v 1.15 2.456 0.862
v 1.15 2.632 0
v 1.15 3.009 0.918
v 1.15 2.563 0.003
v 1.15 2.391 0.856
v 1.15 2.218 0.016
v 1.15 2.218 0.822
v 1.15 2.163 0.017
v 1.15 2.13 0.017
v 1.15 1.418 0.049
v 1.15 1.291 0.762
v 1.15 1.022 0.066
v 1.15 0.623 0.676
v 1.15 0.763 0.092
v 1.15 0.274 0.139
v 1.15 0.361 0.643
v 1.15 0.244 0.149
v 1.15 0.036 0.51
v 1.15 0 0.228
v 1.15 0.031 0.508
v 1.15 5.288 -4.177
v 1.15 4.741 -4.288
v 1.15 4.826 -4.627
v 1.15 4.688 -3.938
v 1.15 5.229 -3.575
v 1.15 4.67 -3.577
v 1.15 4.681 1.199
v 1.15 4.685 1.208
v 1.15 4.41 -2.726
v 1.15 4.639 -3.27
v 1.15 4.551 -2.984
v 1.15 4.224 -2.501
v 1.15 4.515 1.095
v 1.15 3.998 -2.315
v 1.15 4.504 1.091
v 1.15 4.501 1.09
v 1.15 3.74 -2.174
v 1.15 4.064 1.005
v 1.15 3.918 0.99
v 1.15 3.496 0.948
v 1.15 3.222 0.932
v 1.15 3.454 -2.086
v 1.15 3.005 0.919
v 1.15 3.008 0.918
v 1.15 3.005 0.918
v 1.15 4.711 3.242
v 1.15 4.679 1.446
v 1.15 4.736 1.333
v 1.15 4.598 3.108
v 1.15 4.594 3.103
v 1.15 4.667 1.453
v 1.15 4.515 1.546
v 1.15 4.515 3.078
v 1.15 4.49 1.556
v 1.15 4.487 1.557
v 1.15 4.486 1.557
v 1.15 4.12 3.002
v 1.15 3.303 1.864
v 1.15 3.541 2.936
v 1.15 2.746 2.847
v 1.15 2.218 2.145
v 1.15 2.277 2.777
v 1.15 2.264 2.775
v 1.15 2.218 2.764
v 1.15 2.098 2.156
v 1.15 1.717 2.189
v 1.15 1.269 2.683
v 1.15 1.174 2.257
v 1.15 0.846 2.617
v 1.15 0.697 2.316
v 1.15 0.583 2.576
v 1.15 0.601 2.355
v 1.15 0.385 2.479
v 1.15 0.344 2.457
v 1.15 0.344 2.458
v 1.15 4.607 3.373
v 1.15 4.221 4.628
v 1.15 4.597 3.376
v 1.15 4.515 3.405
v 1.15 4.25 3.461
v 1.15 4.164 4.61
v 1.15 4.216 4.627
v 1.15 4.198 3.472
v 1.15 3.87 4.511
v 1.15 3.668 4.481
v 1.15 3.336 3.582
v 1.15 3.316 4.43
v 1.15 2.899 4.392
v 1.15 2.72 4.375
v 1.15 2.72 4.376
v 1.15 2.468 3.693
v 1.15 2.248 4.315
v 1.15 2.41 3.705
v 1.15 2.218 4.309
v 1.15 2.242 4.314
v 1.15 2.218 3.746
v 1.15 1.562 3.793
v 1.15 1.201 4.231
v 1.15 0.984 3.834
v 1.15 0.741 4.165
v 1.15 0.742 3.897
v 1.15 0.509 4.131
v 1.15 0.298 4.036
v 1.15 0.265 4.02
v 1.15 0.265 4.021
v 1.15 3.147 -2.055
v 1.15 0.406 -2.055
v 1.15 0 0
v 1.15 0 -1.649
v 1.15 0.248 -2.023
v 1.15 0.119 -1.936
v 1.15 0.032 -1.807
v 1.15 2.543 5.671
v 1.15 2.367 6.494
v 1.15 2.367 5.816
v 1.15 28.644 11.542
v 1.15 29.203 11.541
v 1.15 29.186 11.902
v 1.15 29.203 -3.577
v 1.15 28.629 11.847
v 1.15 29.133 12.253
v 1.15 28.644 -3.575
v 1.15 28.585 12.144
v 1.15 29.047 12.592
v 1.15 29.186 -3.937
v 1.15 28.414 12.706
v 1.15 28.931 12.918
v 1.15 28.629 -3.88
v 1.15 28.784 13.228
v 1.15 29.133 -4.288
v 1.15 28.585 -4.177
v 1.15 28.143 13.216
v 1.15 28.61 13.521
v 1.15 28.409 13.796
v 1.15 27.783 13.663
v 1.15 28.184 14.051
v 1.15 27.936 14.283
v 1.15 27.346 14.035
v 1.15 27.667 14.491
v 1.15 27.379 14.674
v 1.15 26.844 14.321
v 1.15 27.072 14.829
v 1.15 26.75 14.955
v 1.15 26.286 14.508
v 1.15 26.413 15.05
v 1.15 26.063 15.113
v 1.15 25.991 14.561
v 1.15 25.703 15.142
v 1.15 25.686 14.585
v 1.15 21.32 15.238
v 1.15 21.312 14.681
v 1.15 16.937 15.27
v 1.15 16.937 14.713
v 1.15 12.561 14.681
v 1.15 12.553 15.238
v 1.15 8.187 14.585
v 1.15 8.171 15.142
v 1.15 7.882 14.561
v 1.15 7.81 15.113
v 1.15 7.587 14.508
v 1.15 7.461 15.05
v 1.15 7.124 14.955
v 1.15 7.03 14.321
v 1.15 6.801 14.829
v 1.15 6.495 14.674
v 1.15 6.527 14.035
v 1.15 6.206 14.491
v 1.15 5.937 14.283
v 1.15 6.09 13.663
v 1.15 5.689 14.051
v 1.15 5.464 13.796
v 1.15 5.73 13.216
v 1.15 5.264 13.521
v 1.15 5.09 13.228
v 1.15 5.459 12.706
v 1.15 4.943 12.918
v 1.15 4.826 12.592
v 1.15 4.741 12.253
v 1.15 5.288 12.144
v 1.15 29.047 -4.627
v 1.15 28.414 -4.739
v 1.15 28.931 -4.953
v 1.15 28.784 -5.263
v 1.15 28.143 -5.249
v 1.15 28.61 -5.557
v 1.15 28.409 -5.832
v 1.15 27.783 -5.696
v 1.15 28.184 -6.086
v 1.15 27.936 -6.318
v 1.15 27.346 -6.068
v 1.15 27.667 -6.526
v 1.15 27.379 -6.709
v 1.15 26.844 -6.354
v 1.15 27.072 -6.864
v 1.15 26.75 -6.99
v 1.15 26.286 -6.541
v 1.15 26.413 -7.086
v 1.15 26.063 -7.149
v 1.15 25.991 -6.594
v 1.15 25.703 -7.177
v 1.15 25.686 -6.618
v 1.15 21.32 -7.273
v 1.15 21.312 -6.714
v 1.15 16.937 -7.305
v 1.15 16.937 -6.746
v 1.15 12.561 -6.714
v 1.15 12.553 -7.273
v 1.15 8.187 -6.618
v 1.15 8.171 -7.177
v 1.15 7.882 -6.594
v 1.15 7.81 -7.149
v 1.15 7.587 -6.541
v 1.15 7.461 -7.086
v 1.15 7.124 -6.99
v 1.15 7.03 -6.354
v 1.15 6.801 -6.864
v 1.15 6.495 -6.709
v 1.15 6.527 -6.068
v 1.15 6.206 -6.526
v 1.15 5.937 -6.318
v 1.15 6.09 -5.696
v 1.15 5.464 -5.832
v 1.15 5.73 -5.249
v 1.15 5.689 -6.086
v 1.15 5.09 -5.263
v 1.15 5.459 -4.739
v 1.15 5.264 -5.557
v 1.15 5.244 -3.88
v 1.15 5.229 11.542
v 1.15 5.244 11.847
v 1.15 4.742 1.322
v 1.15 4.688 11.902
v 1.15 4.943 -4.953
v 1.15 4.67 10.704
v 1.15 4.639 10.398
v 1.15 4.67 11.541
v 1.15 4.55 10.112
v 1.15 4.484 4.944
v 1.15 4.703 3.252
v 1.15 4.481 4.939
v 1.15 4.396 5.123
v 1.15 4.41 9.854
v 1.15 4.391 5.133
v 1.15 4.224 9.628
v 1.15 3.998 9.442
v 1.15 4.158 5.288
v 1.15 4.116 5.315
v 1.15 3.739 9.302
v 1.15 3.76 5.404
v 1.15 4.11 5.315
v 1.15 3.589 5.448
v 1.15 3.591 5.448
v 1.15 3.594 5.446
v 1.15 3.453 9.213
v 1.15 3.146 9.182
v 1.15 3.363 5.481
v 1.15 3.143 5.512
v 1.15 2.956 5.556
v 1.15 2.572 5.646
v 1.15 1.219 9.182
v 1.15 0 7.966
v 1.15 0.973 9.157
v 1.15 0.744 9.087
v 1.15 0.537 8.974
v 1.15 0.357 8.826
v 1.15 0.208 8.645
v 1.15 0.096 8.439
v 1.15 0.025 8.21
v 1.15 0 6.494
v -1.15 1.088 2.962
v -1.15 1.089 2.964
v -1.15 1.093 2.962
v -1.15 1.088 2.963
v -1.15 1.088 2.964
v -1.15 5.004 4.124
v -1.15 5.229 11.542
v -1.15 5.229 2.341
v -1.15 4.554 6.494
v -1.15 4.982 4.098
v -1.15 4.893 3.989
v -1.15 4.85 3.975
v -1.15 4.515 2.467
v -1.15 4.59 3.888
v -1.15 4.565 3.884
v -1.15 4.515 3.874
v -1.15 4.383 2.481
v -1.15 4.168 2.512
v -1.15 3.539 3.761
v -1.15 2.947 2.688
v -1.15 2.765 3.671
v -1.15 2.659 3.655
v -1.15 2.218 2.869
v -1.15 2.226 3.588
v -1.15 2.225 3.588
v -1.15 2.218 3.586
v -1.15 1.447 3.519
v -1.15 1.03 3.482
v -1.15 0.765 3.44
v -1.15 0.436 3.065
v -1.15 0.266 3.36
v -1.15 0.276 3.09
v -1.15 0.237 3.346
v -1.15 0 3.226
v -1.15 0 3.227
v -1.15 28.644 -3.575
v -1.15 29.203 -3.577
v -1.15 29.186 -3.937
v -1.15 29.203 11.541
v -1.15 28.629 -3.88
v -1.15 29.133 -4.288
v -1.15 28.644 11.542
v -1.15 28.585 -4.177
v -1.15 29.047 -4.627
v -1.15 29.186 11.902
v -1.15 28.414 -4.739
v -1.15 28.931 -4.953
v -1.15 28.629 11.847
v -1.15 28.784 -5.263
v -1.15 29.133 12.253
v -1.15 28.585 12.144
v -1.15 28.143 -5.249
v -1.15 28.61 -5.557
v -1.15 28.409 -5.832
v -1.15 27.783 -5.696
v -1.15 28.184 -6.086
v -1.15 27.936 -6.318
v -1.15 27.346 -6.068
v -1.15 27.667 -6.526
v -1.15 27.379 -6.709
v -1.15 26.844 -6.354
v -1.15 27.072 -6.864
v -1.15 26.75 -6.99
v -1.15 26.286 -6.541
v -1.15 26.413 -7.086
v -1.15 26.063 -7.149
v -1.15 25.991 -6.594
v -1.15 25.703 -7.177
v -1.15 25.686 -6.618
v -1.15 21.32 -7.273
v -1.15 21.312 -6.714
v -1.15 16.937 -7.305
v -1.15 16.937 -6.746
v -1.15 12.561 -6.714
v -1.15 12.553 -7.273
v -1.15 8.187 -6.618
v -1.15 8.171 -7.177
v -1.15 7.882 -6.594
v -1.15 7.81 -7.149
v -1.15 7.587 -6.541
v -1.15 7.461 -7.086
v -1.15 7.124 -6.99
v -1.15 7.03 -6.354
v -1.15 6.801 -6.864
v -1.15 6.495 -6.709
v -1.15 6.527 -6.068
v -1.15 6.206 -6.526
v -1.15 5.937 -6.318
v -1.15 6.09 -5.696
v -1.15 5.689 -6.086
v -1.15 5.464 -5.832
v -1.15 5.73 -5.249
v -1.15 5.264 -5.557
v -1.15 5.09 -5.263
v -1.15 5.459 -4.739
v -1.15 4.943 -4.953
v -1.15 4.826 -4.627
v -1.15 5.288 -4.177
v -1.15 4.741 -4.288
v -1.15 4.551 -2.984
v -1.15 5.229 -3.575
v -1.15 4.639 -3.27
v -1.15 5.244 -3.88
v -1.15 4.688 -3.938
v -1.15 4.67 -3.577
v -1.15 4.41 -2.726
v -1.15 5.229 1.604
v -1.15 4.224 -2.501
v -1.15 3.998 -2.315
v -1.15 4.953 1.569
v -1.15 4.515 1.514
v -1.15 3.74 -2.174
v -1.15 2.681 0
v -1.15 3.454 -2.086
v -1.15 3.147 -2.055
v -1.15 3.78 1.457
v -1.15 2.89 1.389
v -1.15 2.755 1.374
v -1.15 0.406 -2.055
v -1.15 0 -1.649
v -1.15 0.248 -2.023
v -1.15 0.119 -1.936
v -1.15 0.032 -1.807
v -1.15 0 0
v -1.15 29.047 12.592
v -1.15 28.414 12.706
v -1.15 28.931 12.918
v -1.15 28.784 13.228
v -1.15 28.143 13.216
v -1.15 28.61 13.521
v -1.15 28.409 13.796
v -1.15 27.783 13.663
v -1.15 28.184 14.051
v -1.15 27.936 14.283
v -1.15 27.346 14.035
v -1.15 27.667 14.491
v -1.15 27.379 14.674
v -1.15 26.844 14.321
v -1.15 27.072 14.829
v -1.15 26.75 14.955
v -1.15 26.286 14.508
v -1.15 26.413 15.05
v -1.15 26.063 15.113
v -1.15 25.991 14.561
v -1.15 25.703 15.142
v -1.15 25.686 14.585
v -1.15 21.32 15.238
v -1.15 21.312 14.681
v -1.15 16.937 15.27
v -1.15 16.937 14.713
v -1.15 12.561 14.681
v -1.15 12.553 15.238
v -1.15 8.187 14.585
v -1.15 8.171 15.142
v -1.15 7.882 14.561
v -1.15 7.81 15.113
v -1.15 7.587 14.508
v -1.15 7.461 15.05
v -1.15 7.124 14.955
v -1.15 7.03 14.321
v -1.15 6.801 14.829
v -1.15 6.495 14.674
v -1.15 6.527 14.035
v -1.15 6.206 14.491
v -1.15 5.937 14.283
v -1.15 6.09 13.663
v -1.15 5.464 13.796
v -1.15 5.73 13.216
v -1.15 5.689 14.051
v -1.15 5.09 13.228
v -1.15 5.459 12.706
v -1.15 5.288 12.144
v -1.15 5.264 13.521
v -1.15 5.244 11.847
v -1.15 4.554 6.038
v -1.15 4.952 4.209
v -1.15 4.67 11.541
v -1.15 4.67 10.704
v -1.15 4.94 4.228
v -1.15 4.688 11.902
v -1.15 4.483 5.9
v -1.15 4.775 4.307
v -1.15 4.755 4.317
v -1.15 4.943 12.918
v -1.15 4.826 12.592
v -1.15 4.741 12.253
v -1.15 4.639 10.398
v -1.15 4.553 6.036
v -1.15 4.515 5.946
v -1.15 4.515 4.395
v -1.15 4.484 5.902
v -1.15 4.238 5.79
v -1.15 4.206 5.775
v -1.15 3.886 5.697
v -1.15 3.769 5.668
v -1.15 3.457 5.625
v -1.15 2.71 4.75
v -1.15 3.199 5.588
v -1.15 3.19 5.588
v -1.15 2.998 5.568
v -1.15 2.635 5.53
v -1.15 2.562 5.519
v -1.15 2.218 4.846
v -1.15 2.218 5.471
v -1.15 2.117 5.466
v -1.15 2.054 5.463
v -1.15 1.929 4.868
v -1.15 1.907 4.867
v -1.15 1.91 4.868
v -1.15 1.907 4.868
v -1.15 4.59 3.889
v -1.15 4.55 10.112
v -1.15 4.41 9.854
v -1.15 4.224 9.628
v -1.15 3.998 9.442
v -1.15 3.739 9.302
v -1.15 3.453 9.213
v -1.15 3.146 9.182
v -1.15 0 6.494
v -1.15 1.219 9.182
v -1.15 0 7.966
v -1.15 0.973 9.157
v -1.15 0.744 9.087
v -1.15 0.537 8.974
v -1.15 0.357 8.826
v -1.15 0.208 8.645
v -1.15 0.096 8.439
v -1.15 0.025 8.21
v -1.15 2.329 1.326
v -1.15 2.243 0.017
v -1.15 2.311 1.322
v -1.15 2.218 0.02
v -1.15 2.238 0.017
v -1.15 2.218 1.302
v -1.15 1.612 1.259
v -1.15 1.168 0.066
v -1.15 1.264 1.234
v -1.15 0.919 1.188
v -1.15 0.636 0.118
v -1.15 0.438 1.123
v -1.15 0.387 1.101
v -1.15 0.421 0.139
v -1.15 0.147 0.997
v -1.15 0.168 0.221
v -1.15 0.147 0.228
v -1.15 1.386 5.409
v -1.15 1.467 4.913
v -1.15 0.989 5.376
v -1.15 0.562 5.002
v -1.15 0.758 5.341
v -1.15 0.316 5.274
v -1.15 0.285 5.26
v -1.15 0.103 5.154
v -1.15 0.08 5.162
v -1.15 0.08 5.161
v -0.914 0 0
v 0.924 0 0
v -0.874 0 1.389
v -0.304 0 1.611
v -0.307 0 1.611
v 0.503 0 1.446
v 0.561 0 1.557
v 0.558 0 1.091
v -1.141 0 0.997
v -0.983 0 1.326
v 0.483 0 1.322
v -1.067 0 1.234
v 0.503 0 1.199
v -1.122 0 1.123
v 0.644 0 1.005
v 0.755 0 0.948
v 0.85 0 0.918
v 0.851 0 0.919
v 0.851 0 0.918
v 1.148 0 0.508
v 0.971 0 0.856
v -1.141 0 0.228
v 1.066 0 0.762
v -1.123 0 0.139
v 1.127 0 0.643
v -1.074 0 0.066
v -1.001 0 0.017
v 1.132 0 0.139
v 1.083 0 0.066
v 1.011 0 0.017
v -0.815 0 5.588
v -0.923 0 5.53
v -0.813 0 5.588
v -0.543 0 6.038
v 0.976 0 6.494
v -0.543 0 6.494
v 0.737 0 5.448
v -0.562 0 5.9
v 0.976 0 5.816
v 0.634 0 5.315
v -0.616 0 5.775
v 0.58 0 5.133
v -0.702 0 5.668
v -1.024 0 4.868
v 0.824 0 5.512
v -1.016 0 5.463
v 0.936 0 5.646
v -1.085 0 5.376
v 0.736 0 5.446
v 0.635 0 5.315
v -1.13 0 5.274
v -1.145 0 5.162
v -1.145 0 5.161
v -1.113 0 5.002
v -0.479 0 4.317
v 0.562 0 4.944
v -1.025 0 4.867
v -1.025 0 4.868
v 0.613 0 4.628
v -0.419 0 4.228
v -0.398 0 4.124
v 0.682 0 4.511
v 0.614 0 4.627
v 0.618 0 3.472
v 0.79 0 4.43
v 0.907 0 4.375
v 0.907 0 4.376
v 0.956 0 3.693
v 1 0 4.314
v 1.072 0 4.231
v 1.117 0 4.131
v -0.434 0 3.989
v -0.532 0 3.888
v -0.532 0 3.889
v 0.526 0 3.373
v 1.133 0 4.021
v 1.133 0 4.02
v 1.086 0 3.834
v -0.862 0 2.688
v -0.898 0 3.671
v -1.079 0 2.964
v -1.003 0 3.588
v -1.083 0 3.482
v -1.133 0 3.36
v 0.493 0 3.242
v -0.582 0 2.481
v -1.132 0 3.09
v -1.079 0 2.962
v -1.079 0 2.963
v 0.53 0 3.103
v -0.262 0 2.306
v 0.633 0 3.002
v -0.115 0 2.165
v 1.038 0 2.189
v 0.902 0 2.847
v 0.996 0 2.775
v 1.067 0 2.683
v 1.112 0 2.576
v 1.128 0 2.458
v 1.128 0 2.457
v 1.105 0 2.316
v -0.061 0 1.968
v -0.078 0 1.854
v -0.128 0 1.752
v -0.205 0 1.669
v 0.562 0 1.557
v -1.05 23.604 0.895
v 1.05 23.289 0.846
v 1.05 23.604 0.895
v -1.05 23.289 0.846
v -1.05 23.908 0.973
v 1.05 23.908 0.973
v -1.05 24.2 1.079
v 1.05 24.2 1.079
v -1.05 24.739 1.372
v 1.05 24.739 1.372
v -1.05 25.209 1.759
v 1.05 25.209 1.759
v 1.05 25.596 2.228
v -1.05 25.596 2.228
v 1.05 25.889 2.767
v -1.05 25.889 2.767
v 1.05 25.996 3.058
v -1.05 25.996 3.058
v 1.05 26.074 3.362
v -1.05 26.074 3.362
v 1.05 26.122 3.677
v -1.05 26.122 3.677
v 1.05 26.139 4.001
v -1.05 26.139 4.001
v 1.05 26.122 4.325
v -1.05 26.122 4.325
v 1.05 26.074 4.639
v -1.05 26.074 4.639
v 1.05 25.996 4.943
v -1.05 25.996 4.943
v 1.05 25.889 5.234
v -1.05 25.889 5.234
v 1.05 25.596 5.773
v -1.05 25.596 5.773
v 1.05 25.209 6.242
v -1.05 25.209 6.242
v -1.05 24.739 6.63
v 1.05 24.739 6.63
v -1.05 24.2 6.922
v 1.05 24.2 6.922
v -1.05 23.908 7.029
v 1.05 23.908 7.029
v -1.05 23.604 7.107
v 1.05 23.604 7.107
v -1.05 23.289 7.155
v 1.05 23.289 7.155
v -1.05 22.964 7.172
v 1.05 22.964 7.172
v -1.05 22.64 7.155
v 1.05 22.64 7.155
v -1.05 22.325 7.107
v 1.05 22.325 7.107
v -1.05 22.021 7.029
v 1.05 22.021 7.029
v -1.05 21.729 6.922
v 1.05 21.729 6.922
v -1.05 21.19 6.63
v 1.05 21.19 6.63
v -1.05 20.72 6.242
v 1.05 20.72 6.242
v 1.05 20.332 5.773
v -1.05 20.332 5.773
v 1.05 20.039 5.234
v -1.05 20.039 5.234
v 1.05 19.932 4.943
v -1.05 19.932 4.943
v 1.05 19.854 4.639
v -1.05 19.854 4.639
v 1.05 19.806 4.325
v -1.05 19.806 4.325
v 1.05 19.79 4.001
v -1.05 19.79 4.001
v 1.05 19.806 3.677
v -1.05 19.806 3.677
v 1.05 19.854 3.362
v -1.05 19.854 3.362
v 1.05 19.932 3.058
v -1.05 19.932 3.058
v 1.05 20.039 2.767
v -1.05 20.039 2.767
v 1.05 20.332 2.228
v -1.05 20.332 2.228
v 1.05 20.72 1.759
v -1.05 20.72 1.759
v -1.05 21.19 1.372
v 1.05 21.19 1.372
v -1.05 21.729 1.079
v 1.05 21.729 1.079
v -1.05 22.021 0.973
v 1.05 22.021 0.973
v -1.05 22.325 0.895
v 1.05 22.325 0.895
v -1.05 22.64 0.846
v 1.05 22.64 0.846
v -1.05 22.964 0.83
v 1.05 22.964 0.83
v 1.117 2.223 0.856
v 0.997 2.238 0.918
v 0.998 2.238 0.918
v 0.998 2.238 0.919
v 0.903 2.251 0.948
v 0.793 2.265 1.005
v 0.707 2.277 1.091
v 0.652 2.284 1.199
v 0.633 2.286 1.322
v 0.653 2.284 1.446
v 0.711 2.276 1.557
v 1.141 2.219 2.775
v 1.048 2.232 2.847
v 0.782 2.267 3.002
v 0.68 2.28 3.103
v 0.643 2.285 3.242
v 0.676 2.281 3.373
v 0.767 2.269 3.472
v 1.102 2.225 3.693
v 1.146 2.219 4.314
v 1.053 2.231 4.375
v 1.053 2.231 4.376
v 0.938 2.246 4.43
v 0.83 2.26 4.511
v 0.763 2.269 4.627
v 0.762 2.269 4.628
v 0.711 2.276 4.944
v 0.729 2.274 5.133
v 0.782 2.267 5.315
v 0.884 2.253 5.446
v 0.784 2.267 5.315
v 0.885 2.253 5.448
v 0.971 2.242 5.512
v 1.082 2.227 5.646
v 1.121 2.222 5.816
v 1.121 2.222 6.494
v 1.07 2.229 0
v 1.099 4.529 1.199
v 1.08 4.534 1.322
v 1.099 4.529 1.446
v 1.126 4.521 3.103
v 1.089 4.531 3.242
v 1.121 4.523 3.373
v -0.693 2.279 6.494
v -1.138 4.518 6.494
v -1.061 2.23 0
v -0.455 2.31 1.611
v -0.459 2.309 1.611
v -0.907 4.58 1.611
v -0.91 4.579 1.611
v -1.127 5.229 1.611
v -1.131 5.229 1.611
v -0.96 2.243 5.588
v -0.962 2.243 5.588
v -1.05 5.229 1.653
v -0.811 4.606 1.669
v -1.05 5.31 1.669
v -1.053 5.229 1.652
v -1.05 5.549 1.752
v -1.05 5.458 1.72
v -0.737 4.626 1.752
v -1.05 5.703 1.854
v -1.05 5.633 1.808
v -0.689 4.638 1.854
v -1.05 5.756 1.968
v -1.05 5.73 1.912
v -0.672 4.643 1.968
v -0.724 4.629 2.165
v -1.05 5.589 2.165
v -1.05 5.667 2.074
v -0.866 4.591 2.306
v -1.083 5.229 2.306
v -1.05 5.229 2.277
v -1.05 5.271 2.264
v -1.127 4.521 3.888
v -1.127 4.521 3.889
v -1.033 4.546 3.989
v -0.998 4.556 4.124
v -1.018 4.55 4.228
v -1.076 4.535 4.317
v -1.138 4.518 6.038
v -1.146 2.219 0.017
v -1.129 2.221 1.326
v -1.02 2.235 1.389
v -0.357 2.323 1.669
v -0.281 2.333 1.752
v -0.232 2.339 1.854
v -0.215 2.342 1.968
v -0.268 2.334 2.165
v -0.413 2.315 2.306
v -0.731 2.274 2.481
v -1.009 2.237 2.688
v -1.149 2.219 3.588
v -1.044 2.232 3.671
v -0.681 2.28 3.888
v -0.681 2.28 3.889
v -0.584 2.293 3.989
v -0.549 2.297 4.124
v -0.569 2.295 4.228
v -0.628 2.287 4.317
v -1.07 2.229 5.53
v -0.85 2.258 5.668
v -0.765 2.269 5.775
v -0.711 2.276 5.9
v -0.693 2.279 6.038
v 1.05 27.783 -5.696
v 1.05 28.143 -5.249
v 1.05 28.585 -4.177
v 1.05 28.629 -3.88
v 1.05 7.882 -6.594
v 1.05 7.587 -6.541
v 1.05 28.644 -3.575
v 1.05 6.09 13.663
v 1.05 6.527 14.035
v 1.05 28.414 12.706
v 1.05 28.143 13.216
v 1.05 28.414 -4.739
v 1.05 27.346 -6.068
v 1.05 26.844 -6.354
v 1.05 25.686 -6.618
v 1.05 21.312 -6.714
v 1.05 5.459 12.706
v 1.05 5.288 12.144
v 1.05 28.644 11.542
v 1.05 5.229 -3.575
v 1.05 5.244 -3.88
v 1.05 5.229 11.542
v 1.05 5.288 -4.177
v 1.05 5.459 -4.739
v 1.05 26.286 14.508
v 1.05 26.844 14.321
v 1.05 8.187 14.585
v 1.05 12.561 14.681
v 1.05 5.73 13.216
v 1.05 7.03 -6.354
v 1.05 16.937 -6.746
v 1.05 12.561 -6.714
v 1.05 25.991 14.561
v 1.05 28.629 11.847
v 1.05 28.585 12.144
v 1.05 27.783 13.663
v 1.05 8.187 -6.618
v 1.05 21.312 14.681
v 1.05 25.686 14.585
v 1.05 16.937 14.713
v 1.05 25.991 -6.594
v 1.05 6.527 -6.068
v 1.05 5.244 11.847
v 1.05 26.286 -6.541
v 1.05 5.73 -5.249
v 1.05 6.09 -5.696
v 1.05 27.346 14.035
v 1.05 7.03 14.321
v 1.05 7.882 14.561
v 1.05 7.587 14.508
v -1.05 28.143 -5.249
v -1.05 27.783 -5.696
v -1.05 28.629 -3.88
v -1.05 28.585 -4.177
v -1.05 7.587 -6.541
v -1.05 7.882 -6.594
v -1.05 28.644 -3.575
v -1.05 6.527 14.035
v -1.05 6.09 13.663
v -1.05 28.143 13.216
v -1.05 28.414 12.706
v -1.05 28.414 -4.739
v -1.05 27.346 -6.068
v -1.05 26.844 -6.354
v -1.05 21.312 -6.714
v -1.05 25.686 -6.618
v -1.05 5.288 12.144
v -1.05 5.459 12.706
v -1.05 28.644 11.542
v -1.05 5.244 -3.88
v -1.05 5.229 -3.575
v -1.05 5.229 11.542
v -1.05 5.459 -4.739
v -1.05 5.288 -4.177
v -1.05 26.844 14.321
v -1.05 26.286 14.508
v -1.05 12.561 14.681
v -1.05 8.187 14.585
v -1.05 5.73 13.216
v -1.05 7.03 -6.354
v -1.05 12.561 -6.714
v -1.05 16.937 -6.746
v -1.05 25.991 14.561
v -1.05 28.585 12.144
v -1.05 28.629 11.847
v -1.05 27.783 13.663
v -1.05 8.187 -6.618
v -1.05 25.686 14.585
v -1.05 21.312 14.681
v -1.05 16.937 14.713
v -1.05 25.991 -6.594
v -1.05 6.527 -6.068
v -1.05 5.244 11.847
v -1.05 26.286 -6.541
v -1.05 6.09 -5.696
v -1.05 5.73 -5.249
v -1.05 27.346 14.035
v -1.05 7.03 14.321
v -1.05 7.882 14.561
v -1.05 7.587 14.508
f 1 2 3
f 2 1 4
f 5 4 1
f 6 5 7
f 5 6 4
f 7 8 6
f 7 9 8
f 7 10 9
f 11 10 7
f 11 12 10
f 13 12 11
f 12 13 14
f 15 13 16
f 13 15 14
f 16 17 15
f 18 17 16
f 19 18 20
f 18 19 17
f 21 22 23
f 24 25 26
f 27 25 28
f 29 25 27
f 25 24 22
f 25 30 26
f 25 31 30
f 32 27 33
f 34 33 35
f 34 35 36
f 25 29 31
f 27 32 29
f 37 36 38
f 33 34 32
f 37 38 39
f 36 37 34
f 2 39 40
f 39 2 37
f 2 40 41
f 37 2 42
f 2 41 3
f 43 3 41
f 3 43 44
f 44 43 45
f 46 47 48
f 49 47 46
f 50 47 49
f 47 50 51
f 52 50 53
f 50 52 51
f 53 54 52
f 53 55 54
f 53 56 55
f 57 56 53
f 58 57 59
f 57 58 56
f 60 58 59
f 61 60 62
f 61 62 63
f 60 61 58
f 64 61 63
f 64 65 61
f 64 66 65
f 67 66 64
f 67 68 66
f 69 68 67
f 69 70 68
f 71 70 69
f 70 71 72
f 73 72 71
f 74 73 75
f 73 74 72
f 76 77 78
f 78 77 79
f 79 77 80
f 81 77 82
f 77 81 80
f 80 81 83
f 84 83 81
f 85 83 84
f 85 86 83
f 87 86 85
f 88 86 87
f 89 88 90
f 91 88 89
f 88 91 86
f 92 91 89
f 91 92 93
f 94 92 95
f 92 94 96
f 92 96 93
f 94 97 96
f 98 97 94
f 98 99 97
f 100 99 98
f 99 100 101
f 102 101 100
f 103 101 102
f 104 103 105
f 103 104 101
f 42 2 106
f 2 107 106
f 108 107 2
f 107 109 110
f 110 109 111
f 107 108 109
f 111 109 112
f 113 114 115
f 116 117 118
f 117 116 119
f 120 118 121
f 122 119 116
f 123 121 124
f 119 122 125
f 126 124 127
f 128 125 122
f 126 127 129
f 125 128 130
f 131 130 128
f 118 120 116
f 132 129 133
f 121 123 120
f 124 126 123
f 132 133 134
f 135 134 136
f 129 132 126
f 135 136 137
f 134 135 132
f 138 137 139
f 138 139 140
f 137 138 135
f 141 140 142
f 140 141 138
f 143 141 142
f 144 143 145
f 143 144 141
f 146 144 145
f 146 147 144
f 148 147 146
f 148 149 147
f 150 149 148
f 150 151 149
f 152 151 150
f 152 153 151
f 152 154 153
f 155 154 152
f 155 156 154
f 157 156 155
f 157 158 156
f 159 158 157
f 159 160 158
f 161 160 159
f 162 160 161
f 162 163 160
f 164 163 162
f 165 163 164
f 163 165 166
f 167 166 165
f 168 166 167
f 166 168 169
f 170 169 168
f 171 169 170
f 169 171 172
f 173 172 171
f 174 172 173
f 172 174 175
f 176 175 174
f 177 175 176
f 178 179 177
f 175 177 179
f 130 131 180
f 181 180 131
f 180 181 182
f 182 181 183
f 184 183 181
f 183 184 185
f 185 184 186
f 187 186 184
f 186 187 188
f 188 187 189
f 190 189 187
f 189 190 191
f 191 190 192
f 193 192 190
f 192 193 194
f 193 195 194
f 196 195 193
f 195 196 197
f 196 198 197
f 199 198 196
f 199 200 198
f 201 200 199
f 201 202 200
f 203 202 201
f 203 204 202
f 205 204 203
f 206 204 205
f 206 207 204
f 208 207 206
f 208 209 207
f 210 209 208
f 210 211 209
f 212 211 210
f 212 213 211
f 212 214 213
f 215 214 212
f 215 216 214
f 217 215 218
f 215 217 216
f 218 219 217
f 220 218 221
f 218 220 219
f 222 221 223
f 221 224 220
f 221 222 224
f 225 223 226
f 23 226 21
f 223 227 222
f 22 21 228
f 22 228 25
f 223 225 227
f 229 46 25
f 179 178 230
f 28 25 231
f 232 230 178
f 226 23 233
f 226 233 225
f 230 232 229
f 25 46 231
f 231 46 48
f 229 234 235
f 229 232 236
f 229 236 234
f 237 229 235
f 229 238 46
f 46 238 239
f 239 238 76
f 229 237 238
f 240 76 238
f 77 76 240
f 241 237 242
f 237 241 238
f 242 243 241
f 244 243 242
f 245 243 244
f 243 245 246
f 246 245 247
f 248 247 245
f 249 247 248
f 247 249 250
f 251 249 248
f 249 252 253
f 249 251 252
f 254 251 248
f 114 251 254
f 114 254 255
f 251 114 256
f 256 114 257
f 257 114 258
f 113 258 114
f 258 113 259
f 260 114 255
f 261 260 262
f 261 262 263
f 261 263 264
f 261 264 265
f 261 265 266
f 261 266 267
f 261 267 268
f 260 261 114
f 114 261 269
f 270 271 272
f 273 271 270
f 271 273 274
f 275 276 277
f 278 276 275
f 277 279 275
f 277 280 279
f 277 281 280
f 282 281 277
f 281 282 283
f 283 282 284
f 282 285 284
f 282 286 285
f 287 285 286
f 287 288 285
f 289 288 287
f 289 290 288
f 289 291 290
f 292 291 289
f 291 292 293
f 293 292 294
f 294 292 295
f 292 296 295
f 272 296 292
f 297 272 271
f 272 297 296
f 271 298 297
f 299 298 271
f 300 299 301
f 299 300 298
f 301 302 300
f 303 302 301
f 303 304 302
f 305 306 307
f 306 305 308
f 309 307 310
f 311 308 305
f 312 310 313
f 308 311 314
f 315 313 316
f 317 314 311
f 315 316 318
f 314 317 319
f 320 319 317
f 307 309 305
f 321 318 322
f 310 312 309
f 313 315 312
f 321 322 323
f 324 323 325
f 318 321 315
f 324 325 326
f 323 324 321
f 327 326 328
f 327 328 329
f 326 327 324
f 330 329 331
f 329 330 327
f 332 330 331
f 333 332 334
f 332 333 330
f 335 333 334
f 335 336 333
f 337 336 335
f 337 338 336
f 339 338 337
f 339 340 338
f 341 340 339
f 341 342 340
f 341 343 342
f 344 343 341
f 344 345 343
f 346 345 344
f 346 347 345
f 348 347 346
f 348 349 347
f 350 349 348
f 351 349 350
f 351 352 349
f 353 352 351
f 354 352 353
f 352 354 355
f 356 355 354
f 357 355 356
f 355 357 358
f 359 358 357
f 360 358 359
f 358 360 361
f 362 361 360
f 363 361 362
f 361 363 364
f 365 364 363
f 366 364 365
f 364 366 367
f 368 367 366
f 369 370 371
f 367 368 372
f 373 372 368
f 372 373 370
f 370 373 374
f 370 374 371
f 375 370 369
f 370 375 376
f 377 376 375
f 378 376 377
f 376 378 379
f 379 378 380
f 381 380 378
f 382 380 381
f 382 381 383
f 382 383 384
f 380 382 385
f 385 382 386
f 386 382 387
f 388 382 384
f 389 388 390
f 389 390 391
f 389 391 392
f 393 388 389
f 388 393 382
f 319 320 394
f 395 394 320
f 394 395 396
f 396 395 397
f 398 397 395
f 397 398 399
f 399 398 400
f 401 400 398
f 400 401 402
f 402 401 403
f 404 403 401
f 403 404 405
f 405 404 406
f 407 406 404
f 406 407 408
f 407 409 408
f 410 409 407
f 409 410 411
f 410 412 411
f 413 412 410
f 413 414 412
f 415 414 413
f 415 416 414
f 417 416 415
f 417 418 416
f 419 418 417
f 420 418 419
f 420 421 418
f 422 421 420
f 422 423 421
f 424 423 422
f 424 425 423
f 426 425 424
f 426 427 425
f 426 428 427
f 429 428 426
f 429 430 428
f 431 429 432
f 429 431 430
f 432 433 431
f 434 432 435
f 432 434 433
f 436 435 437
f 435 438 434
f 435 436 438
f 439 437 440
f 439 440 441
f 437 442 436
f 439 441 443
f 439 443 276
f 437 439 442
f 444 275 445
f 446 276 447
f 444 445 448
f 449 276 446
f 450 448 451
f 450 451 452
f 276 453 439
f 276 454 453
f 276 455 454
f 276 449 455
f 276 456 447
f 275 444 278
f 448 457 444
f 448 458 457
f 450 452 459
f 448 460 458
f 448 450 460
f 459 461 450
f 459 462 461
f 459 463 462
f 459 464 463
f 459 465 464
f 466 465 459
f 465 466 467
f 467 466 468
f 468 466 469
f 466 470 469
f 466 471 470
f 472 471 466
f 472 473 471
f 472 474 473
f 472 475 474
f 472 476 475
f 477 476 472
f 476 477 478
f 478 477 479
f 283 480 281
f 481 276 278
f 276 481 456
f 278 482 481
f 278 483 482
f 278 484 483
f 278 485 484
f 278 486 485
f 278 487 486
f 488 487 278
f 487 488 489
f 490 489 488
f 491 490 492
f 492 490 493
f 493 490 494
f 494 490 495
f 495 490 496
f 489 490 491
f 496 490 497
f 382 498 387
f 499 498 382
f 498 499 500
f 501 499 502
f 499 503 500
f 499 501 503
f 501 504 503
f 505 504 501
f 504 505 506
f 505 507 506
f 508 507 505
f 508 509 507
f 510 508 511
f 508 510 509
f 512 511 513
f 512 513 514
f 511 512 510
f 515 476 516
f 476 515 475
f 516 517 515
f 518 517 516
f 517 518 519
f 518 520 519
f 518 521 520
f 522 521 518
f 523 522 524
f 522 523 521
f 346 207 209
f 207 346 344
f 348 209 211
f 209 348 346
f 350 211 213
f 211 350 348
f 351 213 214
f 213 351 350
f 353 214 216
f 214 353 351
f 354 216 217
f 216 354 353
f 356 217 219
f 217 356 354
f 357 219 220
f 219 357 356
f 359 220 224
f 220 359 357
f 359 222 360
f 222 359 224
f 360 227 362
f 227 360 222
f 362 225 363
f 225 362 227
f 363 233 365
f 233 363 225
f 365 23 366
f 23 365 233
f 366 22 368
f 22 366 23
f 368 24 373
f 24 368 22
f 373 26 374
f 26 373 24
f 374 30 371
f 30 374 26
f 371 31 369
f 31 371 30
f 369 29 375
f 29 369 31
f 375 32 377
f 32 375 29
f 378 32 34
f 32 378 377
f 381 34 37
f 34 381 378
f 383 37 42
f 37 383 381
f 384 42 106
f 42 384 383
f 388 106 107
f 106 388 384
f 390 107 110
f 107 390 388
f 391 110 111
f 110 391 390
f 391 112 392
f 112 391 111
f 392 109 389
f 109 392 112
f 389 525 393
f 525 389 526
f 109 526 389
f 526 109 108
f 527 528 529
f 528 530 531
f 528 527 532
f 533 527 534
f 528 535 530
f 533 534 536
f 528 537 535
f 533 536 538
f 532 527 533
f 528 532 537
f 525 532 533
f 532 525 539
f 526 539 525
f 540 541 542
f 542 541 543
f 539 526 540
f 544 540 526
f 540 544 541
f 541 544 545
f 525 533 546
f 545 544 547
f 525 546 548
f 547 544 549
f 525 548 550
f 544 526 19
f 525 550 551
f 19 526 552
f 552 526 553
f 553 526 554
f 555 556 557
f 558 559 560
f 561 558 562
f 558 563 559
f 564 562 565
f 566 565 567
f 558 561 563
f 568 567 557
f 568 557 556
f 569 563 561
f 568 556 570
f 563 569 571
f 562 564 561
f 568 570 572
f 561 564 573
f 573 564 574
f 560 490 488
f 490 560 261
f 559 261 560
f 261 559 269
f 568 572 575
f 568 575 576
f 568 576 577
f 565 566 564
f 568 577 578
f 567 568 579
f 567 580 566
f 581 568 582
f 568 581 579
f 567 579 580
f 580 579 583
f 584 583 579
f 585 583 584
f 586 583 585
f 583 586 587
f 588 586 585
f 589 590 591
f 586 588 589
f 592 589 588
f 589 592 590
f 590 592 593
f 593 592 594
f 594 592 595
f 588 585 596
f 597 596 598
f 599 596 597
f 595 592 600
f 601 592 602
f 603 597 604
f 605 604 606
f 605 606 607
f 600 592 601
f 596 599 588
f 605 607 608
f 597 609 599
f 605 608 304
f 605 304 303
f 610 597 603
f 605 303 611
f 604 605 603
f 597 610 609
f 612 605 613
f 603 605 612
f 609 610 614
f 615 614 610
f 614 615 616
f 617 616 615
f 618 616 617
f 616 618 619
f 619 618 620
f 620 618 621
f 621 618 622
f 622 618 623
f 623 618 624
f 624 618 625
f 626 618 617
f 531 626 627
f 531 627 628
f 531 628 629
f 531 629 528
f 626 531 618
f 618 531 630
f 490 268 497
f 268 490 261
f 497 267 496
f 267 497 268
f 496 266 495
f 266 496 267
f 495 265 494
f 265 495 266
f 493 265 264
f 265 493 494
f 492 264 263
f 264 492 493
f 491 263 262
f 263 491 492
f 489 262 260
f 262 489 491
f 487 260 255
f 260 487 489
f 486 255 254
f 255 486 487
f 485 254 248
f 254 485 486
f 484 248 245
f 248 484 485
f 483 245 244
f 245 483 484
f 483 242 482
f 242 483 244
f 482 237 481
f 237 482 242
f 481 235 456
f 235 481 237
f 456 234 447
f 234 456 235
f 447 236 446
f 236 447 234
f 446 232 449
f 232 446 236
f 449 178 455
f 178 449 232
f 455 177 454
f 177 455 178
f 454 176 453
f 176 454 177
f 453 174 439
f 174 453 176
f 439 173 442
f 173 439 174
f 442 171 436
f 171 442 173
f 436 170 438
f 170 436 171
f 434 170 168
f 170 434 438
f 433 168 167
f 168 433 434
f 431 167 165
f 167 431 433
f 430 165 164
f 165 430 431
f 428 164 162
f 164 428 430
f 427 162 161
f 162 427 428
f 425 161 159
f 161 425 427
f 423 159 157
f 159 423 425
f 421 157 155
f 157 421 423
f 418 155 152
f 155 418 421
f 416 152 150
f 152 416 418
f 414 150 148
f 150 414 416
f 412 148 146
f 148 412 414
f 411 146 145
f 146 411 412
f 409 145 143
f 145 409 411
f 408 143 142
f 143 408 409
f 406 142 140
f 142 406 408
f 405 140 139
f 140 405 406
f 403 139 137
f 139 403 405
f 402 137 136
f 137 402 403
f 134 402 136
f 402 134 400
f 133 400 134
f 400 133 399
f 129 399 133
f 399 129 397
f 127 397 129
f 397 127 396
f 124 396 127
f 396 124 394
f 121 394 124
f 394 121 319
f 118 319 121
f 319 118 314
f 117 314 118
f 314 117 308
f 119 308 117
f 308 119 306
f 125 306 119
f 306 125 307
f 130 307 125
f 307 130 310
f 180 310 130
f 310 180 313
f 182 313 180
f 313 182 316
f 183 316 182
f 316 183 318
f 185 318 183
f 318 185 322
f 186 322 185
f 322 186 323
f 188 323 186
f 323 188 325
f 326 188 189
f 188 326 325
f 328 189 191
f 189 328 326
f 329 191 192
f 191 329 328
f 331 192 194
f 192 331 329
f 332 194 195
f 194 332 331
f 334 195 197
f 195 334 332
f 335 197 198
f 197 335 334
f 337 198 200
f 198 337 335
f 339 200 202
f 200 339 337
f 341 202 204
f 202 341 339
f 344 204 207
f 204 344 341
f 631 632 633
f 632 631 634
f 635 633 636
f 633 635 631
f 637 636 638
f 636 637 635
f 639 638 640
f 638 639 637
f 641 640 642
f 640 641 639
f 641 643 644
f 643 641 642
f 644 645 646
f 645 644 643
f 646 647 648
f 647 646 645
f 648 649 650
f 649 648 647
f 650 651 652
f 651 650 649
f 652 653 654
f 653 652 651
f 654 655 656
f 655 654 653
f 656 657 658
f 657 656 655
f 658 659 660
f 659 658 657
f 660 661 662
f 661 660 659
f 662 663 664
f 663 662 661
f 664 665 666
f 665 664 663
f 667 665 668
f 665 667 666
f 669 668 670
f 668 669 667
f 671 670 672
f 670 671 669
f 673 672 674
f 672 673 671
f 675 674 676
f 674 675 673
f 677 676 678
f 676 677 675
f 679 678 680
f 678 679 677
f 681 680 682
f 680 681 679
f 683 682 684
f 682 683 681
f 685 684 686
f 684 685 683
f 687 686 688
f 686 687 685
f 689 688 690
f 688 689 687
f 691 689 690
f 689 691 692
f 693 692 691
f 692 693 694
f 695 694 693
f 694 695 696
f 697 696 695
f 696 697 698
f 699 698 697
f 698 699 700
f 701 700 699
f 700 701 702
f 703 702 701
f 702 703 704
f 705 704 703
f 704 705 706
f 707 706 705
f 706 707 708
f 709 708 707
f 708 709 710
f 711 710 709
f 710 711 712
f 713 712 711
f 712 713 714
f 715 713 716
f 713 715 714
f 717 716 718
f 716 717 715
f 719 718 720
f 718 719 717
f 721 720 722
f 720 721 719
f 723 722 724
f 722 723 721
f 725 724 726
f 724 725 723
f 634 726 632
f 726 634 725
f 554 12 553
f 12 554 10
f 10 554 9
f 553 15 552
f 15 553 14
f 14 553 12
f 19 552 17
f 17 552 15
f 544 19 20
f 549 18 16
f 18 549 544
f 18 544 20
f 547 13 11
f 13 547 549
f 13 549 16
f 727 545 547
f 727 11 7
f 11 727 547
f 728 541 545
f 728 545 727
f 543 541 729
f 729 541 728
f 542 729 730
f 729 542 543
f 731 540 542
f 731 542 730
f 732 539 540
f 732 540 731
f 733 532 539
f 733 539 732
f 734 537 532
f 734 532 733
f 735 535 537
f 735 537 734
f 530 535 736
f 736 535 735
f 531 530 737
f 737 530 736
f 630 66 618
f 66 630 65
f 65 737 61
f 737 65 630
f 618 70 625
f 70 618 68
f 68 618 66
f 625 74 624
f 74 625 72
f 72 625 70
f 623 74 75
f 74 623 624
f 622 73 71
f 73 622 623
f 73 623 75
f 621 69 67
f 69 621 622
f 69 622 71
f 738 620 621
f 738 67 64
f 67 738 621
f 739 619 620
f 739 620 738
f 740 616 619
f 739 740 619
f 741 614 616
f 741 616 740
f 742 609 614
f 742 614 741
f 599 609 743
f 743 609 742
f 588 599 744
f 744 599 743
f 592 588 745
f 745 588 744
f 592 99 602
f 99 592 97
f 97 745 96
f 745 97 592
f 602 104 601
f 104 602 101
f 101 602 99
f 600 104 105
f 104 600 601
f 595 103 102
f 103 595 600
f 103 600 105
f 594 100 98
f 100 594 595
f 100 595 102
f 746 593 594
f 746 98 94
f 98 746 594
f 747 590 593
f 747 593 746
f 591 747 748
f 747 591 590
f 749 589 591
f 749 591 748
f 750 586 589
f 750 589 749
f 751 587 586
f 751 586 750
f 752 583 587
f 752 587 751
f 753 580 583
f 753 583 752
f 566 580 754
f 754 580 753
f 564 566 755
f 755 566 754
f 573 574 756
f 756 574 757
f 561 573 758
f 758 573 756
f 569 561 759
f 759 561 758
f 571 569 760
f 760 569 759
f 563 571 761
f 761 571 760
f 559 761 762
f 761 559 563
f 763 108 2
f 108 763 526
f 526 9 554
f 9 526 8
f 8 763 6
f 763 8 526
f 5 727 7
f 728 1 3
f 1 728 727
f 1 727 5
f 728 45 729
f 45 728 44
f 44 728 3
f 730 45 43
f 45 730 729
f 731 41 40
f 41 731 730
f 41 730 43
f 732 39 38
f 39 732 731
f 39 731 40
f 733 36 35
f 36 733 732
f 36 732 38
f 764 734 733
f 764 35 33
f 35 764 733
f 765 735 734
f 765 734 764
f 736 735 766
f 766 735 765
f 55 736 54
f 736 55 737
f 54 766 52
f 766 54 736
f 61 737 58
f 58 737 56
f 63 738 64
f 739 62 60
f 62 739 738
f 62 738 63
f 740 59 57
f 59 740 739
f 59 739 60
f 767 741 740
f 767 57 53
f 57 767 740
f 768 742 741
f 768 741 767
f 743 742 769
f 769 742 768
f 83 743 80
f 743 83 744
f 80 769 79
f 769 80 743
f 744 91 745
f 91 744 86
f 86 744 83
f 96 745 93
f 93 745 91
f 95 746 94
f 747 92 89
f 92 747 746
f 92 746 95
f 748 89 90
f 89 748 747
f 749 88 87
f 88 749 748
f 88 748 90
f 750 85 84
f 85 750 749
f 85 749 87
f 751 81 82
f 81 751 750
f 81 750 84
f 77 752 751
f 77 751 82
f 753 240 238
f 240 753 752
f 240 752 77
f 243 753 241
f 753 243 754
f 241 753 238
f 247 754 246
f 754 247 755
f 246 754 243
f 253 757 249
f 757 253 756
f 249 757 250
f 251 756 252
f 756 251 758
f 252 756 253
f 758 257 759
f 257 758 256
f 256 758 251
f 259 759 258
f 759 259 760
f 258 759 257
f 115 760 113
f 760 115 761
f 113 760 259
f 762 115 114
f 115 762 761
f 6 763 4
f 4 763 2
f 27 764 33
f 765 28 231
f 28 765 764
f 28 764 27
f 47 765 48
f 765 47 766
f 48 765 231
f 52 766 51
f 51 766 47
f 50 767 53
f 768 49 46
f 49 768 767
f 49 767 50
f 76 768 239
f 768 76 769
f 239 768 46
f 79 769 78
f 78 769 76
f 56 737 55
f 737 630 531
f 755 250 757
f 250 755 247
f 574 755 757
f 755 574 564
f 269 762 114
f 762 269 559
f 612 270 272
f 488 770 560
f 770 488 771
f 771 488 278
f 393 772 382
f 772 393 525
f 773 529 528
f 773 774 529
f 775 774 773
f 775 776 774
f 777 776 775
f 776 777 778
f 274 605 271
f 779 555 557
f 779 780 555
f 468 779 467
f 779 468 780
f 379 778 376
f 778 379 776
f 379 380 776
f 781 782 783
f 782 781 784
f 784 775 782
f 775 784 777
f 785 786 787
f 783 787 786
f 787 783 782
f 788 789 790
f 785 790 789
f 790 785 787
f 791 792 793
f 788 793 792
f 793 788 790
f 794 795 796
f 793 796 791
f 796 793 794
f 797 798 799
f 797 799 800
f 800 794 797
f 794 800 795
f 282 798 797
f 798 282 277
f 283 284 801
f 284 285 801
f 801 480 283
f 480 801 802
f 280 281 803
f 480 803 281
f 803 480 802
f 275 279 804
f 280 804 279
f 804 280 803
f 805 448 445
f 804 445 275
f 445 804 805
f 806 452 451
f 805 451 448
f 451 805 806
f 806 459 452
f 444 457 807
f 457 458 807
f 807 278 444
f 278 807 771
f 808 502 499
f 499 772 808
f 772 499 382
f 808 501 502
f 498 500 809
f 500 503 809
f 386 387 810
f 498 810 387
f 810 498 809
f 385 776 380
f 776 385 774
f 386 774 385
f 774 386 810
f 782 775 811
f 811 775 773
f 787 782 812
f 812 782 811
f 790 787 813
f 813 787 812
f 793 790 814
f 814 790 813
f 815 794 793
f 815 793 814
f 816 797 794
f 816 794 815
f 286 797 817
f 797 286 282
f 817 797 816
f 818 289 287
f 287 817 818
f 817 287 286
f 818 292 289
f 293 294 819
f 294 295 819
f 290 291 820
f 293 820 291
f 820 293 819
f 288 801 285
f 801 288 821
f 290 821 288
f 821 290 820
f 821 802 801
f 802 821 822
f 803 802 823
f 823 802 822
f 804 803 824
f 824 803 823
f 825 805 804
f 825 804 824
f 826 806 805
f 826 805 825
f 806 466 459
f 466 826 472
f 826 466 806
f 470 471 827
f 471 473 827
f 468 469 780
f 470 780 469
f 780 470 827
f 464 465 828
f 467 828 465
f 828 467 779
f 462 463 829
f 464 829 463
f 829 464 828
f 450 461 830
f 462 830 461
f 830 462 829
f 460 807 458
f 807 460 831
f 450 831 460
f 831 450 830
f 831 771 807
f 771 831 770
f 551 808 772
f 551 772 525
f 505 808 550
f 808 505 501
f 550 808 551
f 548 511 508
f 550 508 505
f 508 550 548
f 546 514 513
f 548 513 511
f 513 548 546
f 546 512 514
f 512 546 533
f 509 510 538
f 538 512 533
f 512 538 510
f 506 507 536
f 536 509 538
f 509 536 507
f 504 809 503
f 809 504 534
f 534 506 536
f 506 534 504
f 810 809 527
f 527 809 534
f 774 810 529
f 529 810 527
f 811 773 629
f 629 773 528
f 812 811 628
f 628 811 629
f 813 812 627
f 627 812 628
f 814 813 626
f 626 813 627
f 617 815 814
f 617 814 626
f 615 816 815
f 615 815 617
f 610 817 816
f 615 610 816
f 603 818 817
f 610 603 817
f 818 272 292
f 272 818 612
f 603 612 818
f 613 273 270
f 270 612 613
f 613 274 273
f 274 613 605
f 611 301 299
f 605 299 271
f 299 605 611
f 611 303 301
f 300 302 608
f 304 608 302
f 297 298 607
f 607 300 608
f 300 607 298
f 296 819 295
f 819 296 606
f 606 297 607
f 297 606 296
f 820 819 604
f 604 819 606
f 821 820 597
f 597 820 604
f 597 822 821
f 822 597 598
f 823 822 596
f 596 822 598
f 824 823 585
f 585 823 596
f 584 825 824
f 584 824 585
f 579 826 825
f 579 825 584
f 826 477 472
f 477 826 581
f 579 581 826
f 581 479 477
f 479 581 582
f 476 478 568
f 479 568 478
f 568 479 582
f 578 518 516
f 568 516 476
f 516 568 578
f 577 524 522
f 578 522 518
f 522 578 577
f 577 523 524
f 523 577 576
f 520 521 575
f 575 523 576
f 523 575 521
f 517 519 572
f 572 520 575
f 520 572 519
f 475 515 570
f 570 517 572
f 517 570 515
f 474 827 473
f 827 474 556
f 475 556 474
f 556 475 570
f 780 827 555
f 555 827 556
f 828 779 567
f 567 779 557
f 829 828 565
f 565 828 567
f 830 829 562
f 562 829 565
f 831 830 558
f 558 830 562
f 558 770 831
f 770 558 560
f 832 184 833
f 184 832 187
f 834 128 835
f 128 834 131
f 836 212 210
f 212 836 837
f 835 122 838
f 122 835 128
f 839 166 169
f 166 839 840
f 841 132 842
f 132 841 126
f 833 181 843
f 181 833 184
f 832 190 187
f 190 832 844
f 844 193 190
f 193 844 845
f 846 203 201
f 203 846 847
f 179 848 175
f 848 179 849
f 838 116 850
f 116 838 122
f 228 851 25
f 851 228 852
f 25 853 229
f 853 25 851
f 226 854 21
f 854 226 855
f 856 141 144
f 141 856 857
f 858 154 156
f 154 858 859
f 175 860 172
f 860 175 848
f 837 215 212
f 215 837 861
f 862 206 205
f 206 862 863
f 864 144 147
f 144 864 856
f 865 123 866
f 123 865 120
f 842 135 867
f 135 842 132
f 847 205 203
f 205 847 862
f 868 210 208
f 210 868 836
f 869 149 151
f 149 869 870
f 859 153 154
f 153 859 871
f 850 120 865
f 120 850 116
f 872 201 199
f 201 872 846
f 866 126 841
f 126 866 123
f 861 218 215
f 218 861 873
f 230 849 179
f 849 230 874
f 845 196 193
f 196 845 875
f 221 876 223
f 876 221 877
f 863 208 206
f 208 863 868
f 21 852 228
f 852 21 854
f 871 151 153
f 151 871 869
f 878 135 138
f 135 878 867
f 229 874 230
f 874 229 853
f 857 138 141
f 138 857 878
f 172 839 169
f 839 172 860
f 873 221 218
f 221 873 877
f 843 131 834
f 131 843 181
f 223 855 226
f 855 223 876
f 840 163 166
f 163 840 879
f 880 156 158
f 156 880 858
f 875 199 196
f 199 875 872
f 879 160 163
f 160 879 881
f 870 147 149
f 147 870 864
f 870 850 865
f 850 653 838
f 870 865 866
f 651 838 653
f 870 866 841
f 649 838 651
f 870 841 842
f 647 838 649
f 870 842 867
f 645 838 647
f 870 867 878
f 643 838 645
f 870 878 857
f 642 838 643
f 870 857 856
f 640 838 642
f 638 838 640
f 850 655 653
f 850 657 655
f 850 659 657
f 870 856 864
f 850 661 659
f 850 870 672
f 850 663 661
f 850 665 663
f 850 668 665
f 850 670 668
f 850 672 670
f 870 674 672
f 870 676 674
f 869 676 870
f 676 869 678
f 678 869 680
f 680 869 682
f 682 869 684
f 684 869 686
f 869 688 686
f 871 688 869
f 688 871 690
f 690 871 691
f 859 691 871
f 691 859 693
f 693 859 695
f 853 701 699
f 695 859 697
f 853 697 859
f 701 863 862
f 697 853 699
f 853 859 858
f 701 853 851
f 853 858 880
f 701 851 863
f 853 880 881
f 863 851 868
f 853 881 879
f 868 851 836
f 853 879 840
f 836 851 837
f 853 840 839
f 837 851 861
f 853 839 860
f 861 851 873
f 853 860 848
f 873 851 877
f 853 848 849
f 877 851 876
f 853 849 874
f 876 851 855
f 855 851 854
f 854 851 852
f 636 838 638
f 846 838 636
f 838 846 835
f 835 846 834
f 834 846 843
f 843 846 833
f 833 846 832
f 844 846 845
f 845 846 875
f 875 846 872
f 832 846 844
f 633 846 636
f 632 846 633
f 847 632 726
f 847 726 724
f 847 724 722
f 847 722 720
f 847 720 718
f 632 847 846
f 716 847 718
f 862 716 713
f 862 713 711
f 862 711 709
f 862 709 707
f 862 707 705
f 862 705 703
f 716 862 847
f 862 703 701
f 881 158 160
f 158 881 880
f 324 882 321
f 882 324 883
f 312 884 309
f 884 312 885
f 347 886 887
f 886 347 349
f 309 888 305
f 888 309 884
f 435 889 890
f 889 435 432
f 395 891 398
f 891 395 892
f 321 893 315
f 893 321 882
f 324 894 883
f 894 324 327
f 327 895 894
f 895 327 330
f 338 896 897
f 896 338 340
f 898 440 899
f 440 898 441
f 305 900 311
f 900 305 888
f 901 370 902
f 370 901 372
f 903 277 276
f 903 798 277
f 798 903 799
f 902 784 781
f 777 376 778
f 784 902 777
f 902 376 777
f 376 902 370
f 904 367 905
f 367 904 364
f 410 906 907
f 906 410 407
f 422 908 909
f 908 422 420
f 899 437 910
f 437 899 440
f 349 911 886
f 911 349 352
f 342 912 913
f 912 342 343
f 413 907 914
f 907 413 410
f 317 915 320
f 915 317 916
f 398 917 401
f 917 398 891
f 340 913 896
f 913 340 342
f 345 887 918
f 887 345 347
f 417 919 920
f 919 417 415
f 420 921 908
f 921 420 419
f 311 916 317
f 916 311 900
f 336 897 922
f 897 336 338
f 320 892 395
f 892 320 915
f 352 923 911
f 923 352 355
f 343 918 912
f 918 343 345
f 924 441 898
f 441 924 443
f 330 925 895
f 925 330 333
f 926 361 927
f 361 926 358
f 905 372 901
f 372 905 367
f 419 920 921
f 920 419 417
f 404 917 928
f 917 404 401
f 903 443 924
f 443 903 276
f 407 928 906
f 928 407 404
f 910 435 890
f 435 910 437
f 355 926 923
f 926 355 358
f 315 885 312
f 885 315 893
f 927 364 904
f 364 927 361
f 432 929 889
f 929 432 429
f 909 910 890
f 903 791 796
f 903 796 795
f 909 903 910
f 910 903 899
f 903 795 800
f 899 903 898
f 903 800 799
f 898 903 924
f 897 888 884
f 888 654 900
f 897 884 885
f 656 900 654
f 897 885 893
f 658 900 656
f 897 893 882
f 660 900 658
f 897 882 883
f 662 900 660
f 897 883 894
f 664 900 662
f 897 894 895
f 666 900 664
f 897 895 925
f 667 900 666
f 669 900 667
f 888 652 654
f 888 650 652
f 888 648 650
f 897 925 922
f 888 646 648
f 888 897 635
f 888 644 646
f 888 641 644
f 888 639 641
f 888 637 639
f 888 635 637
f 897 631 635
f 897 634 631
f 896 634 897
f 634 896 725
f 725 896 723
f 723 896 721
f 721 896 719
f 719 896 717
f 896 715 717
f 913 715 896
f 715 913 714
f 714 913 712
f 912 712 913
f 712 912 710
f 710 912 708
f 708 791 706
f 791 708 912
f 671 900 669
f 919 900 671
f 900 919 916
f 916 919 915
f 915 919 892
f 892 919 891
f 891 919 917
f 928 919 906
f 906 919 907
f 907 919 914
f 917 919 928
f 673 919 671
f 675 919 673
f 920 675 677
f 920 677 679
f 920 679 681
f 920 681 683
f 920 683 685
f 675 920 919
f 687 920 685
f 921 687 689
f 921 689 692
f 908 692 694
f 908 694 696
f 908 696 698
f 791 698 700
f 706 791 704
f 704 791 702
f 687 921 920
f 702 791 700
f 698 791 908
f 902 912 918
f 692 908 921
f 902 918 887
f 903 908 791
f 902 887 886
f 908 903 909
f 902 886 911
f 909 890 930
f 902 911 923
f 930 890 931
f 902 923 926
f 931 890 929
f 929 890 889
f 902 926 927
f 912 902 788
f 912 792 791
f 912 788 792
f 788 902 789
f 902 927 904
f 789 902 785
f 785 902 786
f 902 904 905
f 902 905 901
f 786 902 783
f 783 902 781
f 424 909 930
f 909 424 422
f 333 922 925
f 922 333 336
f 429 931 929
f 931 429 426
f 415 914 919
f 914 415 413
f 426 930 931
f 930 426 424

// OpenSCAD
use <keygen.scad>
include <medeco.scad>

module medeco_biaxial(bitting="",
                      outline_name="",
                      warding_name="") {

    name = "Medeco Biaxial";

    /*
        "A" variants of key outlines indicates 6-pin version.

        Bitting is specified from bow to tip, 1-6, with 1 being the shallowest cut and 6 being the deepest.

        After each number, a letter K,B,Q,L,C,R,M,D,S is specified for the cut angle and offset.

        Example: 2K5B3Q6M3S
        
        Note: KBQ & MDS Biaxial cuts (Fore & Aft) do not appear to be used in conjunction with LCR Classic cuts(Centered)
        
        Example: 2K5B3Q6M3S or 2L5C3R6L3R
    */

    outlines_k = ["A1515",
                  "1515",
                  "A1517",
                  "1517",
                  "1518",
                  "1542",
                  "1543",
                  "A1638",
                  "1638",
                  "1644",
                  "1655"];

    wardings_k = ["1515",
                  "1517",
                  "1518",
                  "1542",
                  "1543",
                  "1638",
                  "1644",
                  "1655"];

    outline_param = key_lkup(outlines_k, outlines_v, outline_name);
    outline_points = outline_param[0];
    outline_paths = outline_param[1];
    offset = outline_param[2];
    engrave_points = outline_param[3];
    engrave_paths = outline_param[4];

    warding_points = key_lkup(wardings_k, wardings_v, warding_name);
    
    cut_locations = [for(i=[0.244, 0.414, 0.584, 0.754, 0.924, 1.094]) i*25.4];
    depth_table = [for(i=[0.272+0.025:-0.025:0.146]) i*25.4];
    angles_k = ["K", "B", "Q", "M", "D", "S", "L", "C", "R"];
    angles_v = [[20, -.7874], [0, -.7874], [-20, -.7874],
                [20, .7874],  [0, .7874],  [-20, .7874], 
                [20, 0],      [0, 0],      [-20, 0]];

    bitting_depth = [for(i=[0:2:len(bitting)-1]) bitting[i]];
    bitting_angle = [for(i=[1:2:len(bitting)-1]) bitting[i]];
    heights = key_code_to_heights(bitting_depth, depth_table);
    angles_and_offsets = [for(c=bitting_angle) key_lkup(angles_k, angles_v, c)];
    angles = [for(c=angles_and_offsets) c[0]];
    offsets = [for(c=angles_and_offsets) c[1]];

    difference() {
        if($children == 0) {
            key_blank(outline_points,
                      warding_points,
                      outline_paths=outline_paths,
                      engrave_right_points=engrave_points,
                      engrave_right_paths=engrave_paths,
                      engrave_left_points=engrave_points,
                      engrave_left_paths=engrave_paths,
                      offset=offset,
                      plug_diameter=12.7);
        } else {
            children(0);
        }
        key_bitting(heights, cut_locations + offsets,
                    flat=.381, angle=86, // from CW-1012 cutter specs
                    angles=angles);
    }
}

// Defaults
bitting="";
outline="1644";
warding="1644";
medeco_biaxial(bitting, outline, warding);
	
